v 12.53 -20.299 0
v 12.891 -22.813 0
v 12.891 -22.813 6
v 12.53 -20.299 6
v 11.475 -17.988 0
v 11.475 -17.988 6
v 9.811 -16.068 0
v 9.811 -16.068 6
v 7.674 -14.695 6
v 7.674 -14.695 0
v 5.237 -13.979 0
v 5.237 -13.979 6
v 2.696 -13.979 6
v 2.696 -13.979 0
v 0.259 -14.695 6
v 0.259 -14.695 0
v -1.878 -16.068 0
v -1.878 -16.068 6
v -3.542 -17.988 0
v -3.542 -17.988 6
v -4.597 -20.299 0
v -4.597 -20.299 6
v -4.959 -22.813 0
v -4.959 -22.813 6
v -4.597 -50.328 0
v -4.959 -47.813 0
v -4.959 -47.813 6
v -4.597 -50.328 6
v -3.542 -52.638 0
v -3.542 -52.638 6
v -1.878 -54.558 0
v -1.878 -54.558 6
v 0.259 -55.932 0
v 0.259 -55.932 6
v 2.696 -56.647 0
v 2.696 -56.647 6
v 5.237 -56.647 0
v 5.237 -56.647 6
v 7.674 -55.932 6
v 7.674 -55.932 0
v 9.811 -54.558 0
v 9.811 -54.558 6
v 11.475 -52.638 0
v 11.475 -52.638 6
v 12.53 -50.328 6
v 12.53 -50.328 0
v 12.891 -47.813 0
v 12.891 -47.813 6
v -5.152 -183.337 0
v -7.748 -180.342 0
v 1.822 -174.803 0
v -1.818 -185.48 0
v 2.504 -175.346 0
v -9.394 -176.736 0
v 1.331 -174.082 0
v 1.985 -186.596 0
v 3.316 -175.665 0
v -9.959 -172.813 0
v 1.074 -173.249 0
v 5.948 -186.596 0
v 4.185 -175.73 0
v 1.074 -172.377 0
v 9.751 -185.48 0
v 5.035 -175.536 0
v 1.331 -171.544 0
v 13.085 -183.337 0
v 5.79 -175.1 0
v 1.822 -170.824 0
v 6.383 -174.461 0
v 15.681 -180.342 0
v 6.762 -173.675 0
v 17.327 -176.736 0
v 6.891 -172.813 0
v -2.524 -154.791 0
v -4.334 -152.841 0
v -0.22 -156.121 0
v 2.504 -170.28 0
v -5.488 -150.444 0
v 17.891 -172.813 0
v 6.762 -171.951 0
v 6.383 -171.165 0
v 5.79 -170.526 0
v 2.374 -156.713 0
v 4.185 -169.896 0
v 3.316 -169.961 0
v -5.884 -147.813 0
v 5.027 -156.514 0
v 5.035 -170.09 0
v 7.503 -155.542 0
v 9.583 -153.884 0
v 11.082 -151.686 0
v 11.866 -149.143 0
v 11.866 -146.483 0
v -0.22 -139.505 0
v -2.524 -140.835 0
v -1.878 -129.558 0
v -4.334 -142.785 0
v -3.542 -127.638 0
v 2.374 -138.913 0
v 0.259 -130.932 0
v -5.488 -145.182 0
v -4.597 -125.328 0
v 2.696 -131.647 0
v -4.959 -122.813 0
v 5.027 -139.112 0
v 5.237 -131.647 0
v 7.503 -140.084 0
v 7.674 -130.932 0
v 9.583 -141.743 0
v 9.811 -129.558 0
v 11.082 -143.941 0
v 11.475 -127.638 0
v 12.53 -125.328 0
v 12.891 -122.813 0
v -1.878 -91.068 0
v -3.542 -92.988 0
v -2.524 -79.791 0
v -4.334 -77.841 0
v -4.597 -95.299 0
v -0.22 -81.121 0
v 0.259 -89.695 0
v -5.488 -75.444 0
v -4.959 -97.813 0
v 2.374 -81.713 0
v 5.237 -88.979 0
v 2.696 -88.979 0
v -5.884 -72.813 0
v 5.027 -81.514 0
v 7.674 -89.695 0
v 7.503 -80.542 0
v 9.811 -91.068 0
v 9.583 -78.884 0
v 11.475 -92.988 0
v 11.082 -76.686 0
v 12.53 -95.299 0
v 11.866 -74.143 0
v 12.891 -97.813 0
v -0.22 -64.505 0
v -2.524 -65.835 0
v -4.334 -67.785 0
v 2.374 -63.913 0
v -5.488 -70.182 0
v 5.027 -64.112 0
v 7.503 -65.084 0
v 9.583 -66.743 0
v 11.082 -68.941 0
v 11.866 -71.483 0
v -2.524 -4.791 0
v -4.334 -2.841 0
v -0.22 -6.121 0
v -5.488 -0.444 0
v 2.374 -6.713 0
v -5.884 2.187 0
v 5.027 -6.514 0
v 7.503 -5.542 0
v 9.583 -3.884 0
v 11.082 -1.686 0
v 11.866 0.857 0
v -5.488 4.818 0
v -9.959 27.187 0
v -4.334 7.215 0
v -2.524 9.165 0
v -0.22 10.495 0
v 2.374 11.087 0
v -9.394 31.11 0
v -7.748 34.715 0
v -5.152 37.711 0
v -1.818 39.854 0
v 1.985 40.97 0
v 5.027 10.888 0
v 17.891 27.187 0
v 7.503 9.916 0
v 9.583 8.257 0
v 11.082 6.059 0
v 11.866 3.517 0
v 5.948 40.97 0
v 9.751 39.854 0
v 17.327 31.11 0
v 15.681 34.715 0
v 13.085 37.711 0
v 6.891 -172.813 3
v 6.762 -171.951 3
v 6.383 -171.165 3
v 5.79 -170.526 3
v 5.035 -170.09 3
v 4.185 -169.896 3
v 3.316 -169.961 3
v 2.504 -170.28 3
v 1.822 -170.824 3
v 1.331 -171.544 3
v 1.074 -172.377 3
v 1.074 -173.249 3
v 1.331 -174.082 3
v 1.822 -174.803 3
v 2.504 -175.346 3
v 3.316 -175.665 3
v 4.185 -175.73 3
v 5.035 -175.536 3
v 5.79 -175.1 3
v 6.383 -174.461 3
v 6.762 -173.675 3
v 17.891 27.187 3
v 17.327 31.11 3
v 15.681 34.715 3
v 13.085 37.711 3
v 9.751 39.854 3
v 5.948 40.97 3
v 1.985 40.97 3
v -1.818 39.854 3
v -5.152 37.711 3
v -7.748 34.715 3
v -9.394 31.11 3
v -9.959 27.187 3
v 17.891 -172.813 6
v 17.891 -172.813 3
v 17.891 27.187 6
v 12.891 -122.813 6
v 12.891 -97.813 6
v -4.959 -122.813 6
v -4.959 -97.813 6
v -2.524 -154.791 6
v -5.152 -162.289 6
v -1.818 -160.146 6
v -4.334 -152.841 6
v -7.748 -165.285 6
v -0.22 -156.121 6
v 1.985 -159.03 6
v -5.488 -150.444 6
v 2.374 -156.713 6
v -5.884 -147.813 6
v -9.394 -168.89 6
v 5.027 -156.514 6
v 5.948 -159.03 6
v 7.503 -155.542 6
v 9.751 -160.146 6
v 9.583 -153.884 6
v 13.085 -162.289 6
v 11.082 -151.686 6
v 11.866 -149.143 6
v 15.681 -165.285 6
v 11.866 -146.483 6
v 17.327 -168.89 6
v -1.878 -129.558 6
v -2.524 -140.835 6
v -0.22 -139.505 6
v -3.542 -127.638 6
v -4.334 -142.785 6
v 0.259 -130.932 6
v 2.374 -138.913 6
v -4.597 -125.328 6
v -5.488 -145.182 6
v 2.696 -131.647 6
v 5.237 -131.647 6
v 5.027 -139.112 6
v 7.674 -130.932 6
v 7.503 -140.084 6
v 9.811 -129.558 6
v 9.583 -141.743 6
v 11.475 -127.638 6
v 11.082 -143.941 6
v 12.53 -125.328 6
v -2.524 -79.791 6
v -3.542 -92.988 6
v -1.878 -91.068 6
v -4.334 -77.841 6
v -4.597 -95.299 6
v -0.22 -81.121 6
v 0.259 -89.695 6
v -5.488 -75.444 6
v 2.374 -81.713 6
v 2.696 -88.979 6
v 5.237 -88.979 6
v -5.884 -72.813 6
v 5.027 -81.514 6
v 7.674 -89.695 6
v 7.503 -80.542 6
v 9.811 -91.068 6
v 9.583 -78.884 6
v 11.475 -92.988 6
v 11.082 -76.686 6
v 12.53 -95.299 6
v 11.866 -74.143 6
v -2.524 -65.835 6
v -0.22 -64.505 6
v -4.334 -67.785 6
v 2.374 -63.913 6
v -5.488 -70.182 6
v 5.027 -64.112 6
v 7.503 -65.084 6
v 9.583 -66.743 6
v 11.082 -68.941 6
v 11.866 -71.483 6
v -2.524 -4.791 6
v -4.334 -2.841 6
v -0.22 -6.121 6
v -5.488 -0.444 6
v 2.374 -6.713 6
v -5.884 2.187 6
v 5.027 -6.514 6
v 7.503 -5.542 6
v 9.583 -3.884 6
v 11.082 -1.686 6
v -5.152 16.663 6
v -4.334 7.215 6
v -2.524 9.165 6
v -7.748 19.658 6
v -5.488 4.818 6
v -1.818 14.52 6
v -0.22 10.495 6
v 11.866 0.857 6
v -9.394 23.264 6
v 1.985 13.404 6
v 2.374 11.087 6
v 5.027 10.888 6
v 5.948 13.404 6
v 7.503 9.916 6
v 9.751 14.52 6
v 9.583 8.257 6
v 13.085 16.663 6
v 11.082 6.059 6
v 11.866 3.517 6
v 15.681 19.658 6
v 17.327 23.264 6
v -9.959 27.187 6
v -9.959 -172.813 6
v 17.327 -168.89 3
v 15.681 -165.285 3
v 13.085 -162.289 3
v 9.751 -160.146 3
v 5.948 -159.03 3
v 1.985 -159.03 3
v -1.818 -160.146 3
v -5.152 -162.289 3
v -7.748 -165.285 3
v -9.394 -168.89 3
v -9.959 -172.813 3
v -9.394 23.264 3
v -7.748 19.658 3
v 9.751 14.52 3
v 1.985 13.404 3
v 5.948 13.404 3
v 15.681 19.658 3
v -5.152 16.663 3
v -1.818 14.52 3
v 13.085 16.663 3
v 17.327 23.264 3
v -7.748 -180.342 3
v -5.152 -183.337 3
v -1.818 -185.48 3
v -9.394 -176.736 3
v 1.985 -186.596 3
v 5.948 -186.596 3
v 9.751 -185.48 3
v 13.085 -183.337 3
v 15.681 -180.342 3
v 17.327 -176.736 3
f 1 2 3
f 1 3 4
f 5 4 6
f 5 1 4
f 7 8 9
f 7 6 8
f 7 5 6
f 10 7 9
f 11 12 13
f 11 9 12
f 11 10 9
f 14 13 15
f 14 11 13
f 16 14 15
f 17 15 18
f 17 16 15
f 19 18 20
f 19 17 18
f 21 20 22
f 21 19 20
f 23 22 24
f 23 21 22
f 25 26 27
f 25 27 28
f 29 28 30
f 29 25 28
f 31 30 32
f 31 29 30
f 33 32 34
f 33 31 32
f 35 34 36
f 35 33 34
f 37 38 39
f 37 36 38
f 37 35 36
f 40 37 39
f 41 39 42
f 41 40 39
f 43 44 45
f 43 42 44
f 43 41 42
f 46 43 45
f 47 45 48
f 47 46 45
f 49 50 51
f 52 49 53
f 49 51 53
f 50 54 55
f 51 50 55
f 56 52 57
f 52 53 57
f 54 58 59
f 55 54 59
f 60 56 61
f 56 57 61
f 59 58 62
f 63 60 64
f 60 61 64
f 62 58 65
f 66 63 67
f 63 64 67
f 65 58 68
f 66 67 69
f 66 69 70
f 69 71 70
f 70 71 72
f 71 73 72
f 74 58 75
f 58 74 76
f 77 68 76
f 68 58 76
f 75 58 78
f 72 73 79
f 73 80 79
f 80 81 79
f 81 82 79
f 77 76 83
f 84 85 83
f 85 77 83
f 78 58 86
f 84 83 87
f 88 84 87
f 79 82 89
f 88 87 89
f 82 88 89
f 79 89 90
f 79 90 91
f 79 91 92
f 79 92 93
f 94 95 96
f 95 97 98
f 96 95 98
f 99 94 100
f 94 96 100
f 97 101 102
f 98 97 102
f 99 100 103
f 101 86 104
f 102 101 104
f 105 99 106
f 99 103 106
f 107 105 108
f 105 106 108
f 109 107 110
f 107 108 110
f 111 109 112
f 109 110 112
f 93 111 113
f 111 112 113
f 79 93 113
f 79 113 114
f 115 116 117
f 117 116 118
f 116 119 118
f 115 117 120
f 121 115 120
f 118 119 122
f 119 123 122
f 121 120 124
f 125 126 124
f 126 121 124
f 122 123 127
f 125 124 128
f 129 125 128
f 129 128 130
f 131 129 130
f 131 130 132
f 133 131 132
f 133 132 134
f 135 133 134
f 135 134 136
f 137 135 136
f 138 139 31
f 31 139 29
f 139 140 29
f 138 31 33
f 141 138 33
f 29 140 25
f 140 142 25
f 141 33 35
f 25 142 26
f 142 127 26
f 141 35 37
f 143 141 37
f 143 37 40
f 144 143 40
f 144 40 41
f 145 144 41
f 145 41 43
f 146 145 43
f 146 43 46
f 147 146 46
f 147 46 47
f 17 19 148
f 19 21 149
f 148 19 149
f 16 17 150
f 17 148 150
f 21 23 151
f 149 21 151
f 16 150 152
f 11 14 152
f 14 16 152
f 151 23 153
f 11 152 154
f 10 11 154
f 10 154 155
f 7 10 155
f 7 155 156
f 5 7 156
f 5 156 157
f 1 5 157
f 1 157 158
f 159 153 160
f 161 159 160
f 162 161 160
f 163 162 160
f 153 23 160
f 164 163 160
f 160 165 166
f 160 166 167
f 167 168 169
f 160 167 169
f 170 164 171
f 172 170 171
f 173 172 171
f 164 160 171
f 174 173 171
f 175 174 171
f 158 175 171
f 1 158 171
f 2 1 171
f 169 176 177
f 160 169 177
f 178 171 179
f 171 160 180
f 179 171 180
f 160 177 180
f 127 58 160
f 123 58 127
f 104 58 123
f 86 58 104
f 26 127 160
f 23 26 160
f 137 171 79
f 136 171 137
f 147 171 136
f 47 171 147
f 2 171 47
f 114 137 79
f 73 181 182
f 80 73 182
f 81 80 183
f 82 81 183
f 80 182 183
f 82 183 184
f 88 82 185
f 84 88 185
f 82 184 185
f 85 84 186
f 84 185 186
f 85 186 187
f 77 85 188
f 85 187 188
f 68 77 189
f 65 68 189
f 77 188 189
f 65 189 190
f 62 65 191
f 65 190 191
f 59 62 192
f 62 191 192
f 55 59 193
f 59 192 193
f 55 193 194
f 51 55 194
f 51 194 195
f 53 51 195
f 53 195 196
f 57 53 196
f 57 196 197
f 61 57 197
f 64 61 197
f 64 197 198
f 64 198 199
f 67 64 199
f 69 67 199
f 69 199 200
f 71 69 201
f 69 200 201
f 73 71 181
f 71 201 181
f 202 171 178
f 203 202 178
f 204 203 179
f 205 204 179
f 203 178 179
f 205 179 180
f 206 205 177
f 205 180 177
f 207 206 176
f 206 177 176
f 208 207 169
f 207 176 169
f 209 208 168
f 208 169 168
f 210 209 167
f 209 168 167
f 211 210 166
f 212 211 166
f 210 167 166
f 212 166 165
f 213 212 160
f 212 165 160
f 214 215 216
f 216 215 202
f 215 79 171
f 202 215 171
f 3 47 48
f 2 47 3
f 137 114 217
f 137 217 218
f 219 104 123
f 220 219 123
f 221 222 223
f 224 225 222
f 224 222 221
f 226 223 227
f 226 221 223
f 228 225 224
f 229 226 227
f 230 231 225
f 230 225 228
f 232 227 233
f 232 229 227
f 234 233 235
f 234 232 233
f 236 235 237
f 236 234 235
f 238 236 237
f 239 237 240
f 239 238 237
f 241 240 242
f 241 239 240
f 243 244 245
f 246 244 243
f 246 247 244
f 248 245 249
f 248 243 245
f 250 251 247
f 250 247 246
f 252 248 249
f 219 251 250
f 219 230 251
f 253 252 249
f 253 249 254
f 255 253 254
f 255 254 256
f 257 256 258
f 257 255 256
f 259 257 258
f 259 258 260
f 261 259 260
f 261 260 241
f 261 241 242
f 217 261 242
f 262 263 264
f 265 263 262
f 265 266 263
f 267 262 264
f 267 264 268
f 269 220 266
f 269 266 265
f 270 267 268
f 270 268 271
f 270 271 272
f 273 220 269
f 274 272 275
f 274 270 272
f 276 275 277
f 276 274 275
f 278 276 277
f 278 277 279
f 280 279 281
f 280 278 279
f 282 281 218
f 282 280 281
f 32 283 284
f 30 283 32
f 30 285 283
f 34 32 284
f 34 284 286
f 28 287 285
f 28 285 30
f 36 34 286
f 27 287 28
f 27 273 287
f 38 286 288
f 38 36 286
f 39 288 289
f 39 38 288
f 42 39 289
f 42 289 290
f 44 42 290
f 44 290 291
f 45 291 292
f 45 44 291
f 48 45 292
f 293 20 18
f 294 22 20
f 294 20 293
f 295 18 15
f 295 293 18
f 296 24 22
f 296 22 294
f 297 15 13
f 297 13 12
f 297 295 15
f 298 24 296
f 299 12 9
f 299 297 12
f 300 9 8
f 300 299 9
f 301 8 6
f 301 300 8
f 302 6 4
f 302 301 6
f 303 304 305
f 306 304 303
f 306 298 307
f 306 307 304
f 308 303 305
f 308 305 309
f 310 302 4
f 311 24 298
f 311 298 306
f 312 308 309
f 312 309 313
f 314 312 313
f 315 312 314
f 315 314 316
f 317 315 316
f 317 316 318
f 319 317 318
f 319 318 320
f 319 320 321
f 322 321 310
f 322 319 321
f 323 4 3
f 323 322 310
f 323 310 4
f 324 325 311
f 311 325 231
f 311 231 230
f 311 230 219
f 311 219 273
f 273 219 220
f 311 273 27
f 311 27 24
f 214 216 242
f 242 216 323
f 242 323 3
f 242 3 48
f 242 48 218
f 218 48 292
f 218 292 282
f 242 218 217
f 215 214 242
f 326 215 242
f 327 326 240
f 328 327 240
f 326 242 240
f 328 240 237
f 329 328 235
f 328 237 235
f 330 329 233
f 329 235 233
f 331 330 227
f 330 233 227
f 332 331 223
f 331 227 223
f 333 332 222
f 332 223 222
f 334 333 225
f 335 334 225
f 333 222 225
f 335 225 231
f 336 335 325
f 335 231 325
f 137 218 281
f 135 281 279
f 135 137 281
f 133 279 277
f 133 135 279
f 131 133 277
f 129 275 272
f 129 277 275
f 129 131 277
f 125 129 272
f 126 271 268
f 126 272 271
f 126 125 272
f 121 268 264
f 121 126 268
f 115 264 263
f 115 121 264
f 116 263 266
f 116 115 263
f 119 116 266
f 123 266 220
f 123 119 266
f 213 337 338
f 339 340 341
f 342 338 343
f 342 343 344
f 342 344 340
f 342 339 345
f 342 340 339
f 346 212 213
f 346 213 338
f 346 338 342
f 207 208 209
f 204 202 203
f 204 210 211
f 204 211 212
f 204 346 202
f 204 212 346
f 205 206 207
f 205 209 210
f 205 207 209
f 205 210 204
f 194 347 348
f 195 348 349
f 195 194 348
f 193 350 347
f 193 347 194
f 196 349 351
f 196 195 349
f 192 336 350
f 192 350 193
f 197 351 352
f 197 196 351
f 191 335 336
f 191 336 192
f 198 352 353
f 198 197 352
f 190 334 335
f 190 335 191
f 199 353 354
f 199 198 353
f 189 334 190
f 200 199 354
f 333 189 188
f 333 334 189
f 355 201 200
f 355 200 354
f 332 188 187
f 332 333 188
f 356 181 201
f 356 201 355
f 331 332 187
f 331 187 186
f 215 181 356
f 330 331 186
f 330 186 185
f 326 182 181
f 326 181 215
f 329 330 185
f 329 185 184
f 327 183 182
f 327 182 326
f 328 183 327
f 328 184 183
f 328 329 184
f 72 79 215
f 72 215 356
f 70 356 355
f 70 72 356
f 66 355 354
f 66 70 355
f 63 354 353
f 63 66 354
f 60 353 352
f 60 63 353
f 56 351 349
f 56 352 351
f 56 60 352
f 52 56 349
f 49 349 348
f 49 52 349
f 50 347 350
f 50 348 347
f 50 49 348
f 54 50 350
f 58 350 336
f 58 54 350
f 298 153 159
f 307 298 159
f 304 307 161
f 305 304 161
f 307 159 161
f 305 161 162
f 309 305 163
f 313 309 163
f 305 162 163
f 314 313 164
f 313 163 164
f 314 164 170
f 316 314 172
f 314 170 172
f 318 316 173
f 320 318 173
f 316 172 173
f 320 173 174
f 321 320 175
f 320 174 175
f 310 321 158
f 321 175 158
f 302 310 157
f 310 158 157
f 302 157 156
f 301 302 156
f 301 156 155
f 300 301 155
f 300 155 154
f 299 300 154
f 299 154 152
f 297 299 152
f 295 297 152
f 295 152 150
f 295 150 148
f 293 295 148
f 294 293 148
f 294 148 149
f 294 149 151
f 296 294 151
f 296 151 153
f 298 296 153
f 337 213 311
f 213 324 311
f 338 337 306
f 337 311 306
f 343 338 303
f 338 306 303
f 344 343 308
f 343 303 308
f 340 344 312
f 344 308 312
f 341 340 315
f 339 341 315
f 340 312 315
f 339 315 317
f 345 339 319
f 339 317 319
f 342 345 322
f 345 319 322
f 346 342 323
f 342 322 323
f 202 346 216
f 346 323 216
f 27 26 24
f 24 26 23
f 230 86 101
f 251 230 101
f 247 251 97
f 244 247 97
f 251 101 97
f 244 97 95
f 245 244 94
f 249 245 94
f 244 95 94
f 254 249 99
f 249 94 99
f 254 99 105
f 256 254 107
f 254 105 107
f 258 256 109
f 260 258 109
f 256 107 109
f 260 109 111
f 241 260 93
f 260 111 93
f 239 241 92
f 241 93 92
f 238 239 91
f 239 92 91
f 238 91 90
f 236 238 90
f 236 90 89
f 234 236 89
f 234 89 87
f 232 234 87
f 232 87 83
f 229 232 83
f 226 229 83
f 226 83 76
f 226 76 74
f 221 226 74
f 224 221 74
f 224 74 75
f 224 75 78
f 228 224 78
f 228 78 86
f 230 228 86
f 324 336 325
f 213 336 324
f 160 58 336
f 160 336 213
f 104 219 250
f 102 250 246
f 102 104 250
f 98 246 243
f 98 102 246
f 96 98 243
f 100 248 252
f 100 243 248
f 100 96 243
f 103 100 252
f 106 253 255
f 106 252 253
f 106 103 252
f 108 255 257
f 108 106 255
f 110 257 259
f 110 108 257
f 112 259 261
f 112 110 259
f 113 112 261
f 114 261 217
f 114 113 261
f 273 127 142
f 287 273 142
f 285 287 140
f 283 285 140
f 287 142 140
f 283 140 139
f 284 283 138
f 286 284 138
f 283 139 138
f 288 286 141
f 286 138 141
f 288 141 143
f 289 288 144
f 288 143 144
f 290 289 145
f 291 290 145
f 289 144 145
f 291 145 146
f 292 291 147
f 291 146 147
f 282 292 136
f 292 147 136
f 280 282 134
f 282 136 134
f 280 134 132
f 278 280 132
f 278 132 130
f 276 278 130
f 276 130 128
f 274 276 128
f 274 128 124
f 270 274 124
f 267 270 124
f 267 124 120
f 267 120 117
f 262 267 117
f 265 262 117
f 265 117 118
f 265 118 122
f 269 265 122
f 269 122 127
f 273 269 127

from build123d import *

# Parameters (mm, degrees)
ESQUISSE1_W             = 27.85
ESQUISSE1_H             = 200
BOSS_EXTRU_1_DEPTH      = 6
ESQUISSE2_R             = 13.925
ENL_V_MAT_EXTRU_1_DEPTH = 3
ESQUISSE3_R             = 2.925
ENL_V_MAT_EXTRU_2_DEPTH = 3
ESQUISSE5_R             = 13.925
ENL_V_MAT_EXTRU_3_DEPTH = 3
ESQUISSE6_R             = 8.925
ESQUISSE6_W             = 17.85
ESQUISSE6_H             = 25
ENL_V_MAT_EXTRU_4_DEPTH = 10


with BuildPart() as part:
    # Esquisse1 → Boss.-Extru.1 (new body)
    with BuildSketch(Plane.XY):
        with Locations((3.966452722, -72.813095238)):
            Rectangle(ESQUISSE1_W, ESQUISSE1_H)
        with BuildLine():
            Line((-9.958547278, -172.813095238), (17.891452722, -172.813095238))
            ThreePointArc((17.891452722, -172.813095238), (3.966452722, -186.738095238), (-9.958547278, -172.813095238))
        make_face()
        with BuildLine():
            Line((-9.958547278, 27.186904762), (17.891452722, 27.186904762))
            ThreePointArc((17.891452722, 27.186904762), (3.966452722, 41.111904762), (-9.958547278, 27.186904762))
        make_face()
    extrude(amount=BOSS_EXTRU_1_DEPTH)

    # Esquisse2 → Enlèv. mat.-Extru.1 (cut)
    with BuildSketch(Plane.XY.offset(6)):
        with Locations((3.966452722, -172.813095238)):
            Circle(ESQUISSE2_R)
    extrude(amount=-ENL_V_MAT_EXTRU_1_DEPTH, mode=Mode.SUBTRACT)

    # Esquisse3 → Enlèv. mat.-Extru.2 (cut)
    with BuildSketch(Plane.XY.offset(3)):
        with Locations((3.966452722, -172.813095238)):
            Circle(ESQUISSE3_R)
    extrude(amount=-ENL_V_MAT_EXTRU_2_DEPTH, mode=Mode.SUBTRACT)

    # Esquisse5 → Enlèv. mat.-Extru.3 (cut)
    with BuildSketch(Plane.XY.offset(6)):
        with Locations((3.966452722, 27.186904762)):
            Circle(ESQUISSE5_R)
    extrude(amount=-ENL_V_MAT_EXTRU_3_DEPTH, mode=Mode.SUBTRACT)

    # Esquisse6 → Enlèv. mat.-Extru.4 (cut)
    with BuildSketch(Plane(origin=(0, 0, 0), x_dir=(-1, 0, 0), z_dir=(0, 0, -1))):
        with Locations((-3.040571359, 2.186904762)):
            Circle(ESQUISSE6_R)
        with BuildLine():
            ThreePointArc((-12.891452722, -22.813095238), (-3.966452722, -13.888095238), (4.958547278, -22.813095238))
            Line((4.958547278, -22.813095238), (-12.891452722, -22.813095238))
        make_face()
        with Locations((-3.966452722, -35.313095238)):
            Rectangle(ESQUISSE6_W, ESQUISSE6_H)
        with BuildLine():
            ThreePointArc((4.958547278, -47.813095238), (-3.966452722, -56.738095238), (-12.891452722, -47.813095238))
            Line((-12.891452722, -47.813095238), (4.958547278, -47.813095238))
        make_face()
        with Locations((-3.040571359, -72.813095238)):
            Circle(ESQUISSE6_R)
        with Locations((-3.966452722, -110.313095238)):
            Rectangle(ESQUISSE6_W, ESQUISSE6_H)
        with BuildLine():
            ThreePointArc((-12.891452722, -97.813095238), (-3.966452722, -88.888095238), (4.958547278, -97.813095238))
            Line((4.958547278, -97.813095238), (-12.891452722, -97.813095238))
        make_face()
        with BuildLine():
            ThreePointArc((4.958547278, -122.813095238), (-3.966452722, -131.738095238), (-12.891452722, -122.813095238))
            Line((-12.891452722, -122.813095238), (4.958547278, -122.813095238))
        make_face()
        with Locations((-3.040571359, -147.813095238)):
            Circle(ESQUISSE6_R)
    extrude(amount=-ENL_V_MAT_EXTRU_4_DEPTH, mode=Mode.SUBTRACT)


solid = part.part
